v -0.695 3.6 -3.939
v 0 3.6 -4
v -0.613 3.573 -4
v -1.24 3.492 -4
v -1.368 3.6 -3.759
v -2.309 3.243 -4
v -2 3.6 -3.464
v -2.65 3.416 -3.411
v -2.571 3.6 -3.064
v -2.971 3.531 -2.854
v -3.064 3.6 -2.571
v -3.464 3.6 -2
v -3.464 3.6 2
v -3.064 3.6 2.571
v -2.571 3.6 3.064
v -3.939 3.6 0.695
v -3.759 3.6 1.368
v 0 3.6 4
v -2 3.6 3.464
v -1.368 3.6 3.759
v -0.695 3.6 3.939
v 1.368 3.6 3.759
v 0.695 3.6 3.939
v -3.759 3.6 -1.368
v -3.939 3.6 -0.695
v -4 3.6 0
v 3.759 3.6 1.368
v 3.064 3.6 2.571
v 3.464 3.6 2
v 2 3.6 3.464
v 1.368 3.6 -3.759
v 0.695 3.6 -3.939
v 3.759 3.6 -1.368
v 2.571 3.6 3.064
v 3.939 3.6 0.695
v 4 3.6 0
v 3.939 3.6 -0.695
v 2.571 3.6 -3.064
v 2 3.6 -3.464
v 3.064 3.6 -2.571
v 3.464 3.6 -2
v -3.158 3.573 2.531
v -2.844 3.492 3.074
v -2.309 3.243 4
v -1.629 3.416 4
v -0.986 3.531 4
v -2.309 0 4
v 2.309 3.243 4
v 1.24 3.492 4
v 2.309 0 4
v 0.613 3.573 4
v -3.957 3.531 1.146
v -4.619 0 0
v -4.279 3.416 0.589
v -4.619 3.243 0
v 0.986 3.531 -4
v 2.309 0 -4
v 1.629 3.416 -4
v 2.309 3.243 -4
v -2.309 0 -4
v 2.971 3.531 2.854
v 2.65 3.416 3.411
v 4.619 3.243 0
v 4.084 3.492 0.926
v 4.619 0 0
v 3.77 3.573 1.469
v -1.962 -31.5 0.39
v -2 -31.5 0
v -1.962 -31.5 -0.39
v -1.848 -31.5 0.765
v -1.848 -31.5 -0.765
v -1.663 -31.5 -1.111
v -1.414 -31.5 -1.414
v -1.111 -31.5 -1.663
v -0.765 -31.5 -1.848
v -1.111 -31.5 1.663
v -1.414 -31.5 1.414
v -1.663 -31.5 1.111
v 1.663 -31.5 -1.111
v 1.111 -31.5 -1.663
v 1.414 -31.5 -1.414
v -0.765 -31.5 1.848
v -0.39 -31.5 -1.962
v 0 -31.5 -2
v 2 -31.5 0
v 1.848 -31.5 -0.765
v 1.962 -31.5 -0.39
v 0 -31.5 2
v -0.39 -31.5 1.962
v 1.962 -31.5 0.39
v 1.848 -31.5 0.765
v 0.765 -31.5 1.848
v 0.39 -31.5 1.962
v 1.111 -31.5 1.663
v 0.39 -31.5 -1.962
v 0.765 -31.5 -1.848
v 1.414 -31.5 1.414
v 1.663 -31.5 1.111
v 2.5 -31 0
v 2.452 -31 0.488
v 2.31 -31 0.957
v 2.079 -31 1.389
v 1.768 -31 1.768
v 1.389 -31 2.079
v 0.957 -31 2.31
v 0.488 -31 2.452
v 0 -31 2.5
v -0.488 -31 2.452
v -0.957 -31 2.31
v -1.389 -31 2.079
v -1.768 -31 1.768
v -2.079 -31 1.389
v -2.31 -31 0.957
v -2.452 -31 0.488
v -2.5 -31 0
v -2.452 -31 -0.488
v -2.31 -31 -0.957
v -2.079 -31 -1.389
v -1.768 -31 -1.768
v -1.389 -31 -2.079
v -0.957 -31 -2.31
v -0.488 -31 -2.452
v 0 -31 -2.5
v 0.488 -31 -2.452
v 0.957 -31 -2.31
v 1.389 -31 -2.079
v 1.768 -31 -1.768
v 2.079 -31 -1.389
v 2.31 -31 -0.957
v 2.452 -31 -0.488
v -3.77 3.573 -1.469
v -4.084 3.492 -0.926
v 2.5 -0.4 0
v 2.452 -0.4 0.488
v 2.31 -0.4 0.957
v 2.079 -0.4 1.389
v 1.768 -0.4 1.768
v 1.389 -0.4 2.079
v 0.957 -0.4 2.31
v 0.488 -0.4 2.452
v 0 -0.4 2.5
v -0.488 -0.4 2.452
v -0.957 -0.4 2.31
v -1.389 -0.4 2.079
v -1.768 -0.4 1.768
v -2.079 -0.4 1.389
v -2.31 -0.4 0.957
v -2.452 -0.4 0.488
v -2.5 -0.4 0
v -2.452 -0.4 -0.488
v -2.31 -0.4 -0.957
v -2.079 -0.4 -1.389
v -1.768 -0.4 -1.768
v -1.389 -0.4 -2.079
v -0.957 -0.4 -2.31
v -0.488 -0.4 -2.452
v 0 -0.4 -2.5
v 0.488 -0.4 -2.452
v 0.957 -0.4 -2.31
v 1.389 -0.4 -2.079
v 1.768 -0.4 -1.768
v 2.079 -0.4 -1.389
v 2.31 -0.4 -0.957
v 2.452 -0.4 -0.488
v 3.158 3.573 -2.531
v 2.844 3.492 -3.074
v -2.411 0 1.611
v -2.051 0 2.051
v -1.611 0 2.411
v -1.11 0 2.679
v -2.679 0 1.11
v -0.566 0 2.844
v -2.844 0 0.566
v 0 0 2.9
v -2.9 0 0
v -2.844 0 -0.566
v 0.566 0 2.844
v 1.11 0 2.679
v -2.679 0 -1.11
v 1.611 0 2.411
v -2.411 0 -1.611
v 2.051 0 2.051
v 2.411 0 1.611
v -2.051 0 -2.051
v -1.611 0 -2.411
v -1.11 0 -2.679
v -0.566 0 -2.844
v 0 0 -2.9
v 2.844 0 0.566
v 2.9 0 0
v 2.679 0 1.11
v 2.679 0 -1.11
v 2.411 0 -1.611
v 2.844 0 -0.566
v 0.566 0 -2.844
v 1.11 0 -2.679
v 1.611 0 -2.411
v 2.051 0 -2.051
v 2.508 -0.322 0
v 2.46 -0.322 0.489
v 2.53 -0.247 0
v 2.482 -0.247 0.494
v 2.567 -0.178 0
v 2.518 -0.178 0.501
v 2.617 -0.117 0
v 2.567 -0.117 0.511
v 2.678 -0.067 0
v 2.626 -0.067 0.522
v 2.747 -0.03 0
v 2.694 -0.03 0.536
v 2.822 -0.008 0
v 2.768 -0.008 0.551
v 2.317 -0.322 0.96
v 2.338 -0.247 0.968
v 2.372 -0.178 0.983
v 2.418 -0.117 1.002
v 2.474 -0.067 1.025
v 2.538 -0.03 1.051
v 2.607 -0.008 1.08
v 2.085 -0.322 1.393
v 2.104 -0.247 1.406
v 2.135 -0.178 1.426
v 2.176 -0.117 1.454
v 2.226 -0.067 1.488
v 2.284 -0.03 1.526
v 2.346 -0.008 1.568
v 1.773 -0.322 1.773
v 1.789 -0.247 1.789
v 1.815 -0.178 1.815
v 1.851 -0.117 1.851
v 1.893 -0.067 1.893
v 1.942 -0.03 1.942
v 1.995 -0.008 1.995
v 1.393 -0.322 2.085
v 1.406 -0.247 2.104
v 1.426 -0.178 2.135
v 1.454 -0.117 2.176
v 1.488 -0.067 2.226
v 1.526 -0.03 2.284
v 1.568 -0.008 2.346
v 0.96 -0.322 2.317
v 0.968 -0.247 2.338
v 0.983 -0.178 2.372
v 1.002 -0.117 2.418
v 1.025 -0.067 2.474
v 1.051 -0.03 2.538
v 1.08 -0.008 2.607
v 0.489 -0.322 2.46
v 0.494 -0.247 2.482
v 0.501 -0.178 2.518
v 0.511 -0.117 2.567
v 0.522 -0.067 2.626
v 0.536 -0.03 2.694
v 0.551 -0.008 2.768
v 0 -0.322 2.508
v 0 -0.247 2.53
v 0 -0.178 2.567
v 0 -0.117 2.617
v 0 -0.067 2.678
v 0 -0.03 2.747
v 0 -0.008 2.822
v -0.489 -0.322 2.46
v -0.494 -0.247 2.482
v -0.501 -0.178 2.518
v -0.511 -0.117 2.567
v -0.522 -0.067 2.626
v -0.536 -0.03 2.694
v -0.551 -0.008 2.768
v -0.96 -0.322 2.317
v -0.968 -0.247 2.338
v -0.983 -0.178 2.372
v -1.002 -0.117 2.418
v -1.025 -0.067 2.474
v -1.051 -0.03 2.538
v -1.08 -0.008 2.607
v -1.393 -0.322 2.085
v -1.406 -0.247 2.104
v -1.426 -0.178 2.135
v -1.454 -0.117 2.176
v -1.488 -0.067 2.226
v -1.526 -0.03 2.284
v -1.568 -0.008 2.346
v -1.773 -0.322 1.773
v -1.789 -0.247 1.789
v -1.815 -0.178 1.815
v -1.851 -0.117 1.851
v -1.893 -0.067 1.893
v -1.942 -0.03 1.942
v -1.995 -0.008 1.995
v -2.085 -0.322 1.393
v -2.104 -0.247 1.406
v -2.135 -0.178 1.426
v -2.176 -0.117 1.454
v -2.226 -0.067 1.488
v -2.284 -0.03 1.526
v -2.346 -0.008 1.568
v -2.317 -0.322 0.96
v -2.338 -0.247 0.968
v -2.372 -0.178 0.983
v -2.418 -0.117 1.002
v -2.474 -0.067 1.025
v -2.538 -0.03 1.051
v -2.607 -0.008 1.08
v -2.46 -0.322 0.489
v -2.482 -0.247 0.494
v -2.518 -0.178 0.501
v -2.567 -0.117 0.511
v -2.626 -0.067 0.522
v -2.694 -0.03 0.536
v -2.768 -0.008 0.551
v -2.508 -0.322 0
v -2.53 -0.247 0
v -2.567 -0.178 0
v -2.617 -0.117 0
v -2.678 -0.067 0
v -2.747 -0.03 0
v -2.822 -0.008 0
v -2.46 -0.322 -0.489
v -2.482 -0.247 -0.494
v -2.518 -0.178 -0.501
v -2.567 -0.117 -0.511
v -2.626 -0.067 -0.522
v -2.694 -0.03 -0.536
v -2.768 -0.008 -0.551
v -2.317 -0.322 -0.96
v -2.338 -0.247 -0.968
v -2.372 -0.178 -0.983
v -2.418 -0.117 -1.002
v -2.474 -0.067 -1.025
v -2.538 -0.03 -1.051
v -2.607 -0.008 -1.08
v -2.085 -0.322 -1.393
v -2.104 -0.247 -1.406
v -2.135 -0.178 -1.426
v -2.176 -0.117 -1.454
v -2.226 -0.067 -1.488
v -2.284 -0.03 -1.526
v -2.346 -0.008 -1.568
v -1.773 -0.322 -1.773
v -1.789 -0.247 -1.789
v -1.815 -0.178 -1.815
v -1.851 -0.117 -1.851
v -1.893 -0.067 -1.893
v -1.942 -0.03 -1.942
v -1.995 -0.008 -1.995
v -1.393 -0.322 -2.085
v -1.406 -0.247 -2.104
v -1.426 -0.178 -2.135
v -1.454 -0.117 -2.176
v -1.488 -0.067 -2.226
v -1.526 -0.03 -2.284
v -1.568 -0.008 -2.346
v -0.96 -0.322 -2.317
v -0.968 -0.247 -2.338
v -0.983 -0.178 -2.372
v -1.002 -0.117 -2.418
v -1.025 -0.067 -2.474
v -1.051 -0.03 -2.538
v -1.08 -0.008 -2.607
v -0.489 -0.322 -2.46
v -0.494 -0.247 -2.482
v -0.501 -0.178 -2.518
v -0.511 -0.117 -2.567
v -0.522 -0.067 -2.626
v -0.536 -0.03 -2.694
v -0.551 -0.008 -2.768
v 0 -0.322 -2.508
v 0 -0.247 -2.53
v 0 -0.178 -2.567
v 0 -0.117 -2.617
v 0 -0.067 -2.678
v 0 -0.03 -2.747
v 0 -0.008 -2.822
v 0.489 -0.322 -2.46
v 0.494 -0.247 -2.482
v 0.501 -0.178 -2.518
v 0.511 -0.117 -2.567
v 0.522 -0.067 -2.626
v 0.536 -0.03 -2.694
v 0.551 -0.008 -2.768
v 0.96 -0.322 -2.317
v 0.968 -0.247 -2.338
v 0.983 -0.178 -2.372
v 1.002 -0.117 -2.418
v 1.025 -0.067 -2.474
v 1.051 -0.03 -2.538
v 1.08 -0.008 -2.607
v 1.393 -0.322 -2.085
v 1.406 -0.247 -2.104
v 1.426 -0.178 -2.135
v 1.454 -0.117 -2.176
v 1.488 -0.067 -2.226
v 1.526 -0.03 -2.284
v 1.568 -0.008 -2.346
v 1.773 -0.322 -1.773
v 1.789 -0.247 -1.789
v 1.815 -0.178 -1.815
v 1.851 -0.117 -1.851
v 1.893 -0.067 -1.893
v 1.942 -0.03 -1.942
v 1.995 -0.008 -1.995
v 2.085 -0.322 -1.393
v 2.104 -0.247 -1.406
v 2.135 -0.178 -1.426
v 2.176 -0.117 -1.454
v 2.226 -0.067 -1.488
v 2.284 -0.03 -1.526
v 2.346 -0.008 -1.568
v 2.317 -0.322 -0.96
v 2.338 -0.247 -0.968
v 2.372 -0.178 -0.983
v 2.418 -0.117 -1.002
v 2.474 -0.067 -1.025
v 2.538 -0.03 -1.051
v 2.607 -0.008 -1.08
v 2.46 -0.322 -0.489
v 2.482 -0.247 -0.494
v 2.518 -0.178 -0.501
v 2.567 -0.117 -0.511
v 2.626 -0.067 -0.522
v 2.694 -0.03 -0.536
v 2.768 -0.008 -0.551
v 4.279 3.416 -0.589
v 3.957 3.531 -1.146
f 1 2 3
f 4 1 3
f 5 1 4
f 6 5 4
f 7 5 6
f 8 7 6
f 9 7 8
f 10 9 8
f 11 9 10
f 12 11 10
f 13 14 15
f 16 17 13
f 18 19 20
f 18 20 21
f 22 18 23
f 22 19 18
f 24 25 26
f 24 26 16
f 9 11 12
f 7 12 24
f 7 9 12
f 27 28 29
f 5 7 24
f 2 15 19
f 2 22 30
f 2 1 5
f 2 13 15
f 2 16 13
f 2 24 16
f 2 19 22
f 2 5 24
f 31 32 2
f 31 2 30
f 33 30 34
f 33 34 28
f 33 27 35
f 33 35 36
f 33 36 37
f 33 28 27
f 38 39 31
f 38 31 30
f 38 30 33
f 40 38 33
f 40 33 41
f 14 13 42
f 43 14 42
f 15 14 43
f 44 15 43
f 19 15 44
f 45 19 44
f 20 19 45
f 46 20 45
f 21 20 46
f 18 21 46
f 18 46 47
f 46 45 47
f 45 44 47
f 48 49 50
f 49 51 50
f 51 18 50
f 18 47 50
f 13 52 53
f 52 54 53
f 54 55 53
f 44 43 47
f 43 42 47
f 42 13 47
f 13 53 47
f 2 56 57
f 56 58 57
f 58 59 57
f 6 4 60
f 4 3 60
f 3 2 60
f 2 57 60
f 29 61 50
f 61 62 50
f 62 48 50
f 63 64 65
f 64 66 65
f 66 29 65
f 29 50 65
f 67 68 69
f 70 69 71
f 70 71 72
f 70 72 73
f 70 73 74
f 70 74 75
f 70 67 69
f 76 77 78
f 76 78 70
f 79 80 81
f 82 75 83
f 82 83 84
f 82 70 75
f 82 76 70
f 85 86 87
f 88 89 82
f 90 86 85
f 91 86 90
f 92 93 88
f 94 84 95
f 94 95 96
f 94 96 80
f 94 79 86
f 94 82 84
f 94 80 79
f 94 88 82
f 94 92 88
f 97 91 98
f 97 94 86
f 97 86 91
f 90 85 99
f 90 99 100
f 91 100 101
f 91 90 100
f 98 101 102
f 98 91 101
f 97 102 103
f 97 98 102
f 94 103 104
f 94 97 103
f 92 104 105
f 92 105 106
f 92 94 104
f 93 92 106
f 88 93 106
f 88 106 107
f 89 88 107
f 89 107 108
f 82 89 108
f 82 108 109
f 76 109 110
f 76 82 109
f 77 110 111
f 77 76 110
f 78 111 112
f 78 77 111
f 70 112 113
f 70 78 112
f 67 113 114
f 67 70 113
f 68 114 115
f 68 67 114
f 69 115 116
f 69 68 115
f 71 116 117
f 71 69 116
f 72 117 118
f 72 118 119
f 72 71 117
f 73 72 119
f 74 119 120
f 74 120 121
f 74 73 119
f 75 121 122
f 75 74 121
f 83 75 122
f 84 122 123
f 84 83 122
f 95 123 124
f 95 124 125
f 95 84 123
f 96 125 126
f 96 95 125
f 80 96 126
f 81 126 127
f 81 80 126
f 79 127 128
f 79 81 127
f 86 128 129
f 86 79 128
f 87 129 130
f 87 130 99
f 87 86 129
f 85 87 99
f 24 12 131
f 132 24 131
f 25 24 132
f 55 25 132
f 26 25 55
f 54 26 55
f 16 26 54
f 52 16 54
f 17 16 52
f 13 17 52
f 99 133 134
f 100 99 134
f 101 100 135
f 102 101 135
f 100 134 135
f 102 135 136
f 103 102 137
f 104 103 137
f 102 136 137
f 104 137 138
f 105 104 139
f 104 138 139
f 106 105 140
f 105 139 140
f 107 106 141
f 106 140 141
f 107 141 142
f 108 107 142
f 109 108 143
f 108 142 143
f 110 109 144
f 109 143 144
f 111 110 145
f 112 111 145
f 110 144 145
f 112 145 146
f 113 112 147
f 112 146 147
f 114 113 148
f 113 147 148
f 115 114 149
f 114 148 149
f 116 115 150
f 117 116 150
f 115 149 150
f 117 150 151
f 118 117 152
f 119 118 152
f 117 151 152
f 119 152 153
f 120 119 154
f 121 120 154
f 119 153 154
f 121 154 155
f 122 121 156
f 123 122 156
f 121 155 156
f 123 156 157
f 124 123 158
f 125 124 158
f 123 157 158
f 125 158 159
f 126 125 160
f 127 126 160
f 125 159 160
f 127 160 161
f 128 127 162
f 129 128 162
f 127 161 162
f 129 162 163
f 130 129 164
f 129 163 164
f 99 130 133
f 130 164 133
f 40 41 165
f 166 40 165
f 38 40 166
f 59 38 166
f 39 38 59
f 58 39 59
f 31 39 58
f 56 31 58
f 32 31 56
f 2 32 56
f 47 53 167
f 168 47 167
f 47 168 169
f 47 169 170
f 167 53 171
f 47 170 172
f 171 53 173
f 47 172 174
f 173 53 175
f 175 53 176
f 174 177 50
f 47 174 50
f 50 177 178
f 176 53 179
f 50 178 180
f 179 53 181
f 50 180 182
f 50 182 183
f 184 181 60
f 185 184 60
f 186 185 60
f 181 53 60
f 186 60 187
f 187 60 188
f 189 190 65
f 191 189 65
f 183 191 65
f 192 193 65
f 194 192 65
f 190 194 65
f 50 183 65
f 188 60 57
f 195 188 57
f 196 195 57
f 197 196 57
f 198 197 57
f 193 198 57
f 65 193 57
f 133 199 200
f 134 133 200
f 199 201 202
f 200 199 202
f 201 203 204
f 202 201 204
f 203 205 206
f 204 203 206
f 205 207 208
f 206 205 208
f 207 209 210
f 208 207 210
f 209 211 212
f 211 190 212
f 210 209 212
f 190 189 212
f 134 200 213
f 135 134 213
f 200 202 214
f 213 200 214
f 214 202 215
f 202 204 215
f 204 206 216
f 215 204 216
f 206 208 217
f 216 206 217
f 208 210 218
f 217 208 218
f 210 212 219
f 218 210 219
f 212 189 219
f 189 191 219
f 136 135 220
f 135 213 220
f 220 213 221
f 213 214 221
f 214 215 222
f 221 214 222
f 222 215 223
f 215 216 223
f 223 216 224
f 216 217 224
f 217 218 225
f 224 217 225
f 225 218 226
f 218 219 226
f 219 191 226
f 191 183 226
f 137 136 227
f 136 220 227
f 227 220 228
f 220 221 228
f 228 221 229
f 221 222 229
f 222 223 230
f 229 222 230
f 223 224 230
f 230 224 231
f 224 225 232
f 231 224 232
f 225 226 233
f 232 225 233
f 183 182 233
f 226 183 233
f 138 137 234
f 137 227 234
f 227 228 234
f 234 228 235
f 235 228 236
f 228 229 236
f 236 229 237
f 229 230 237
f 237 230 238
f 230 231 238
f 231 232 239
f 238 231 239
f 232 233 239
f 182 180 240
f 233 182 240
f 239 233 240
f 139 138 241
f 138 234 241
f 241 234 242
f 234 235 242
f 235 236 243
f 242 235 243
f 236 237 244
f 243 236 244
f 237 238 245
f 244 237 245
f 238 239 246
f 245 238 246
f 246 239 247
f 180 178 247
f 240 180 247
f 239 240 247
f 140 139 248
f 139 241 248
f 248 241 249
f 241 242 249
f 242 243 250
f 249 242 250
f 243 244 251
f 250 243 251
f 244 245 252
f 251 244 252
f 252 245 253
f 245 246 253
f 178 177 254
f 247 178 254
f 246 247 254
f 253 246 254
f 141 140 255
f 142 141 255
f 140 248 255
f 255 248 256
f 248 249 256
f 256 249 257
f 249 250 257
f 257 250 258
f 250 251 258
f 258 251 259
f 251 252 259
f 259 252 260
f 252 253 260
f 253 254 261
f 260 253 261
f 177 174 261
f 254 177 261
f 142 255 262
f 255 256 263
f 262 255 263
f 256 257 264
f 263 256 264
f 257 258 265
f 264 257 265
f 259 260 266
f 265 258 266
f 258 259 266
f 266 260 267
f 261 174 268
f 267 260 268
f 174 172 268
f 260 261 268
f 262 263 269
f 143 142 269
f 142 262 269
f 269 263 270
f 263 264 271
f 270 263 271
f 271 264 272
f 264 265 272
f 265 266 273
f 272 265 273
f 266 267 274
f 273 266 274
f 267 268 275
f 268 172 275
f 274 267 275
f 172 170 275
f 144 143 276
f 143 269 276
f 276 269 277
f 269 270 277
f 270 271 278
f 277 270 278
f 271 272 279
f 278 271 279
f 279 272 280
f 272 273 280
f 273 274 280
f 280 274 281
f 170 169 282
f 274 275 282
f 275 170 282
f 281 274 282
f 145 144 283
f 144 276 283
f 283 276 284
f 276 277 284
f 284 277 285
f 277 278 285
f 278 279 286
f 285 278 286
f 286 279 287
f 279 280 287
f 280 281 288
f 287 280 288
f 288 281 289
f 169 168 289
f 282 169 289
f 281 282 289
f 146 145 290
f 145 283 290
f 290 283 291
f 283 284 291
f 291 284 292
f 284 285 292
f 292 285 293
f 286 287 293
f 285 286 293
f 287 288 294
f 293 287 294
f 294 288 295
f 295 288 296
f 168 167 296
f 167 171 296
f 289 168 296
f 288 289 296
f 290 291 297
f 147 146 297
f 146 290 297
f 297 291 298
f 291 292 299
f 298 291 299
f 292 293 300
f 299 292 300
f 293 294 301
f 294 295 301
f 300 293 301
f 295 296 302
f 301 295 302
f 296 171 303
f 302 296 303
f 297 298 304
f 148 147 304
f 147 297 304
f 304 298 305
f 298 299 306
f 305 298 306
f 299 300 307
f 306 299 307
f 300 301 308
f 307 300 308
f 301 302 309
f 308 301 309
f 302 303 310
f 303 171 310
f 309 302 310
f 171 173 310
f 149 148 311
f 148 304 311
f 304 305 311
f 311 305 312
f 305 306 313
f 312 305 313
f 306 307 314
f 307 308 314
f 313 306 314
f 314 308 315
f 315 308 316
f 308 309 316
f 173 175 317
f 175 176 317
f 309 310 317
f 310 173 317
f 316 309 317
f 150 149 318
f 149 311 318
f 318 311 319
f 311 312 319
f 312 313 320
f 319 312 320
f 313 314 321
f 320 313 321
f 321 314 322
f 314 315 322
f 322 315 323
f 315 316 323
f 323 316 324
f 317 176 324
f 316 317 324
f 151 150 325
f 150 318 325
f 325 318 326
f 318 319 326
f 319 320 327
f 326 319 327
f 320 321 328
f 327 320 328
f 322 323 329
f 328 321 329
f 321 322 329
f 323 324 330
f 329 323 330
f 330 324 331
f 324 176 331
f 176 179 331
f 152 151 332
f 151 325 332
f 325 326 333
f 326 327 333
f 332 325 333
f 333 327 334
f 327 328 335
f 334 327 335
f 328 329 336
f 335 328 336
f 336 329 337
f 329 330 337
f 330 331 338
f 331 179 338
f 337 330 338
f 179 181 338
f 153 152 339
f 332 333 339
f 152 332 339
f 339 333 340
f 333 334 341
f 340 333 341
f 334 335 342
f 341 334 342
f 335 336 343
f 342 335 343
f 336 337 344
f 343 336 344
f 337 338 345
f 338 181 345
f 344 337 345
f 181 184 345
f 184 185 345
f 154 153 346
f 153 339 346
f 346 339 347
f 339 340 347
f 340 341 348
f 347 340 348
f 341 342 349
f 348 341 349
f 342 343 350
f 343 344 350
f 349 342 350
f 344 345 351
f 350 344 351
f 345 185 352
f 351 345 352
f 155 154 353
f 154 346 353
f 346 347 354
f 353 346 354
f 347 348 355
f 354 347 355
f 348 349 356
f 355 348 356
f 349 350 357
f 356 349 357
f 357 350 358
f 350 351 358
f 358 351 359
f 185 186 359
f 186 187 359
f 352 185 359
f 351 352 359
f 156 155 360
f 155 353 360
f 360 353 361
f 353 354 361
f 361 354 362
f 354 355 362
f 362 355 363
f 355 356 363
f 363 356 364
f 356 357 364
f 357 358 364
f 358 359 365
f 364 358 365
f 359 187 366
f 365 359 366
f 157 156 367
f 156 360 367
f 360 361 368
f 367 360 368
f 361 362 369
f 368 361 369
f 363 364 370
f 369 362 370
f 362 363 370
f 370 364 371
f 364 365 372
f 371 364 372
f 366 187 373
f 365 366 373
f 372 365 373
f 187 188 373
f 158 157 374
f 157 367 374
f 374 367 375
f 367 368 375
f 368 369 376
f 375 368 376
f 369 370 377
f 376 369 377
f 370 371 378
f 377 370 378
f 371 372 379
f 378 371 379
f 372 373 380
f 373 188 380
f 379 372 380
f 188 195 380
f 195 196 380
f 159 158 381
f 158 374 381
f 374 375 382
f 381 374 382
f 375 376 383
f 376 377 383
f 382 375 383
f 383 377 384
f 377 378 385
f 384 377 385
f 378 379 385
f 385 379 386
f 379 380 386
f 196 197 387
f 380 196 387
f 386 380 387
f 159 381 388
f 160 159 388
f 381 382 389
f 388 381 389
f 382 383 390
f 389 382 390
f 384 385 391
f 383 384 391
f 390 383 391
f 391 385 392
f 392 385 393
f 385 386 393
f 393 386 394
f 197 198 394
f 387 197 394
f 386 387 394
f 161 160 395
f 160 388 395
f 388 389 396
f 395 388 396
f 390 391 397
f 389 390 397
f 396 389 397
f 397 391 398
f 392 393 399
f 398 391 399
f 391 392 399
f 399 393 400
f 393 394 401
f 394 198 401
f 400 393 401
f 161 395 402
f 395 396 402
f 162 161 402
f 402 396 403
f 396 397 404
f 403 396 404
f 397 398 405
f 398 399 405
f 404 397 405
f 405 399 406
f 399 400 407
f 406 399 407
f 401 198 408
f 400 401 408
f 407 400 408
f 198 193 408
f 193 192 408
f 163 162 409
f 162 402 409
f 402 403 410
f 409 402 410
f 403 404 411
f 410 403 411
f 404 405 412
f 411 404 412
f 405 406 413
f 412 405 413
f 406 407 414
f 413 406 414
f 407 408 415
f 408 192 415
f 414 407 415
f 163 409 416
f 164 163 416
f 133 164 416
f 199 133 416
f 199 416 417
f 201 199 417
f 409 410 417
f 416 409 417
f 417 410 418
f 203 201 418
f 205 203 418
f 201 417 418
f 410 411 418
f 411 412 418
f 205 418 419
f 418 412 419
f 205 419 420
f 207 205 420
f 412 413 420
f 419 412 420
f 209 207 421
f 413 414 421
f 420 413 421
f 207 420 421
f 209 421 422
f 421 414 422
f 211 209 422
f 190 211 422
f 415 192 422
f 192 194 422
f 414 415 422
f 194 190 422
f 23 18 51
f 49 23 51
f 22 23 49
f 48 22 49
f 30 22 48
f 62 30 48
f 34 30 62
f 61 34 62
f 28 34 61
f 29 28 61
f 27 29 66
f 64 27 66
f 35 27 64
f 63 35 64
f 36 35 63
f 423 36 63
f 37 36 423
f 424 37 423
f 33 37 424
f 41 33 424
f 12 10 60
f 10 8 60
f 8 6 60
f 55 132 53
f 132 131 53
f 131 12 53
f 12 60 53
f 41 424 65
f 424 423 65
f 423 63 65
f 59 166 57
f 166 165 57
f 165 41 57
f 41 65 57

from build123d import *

# Parameters (mm, degrees)
BOSS_EXTRUDE1_DEPTH = 3.6
SKETCH3_R           = 2.5
BOSS_EXTRUDE2_DEPTH = 31.5
CHAMFER1_SIZE       = 0.5
FILLET1_R           = 0.4


with BuildPart() as part:
    # Sketch1 → Boss-Extrude1 (new body)
    with BuildSketch(Plane(origin=(0, 0, 0), x_dir=(1, 0, 0), z_dir=(0, 1, 0))):
        Polygon((-2.309401077, -4), (2.309401077, -4), (4.618802154, 0), (2.309401077, 4), (-2.309401077, 4), (-4.618802154, 0), align=None)
    extrude(amount=BOSS_EXTRUDE1_DEPTH)

    # Sketch2 → Cut-Revolve1 (revolve, cut)
    with BuildSketch(Plane(origin=(0, 0, 0), x_dir=(0, 0, -1), z_dir=(1, 0, 0))):
        Polygon((8.326224825, 1.102252933), (4, 3.6), (8.326224825, 3.6), align=None)
    revolve(axis=Axis((0, 0, 0), (0, 1, 0)), mode=Mode.SUBTRACT)

    # Sketch3 → Boss-Extrude2 (add)
    with BuildSketch(Plane.XZ):
        Circle(SKETCH3_R)
    extrude(amount=BOSS_EXTRUDE2_DEPTH)

    # Chamfer1
    chamfer1_edges = [part.edges().sort_by_distance(p)[0] for p in [
        (-2.5, -31.5, 0),
    ]]
    chamfer(chamfer1_edges, length=CHAMFER1_SIZE)

    # Fillet1
    fillet1_edges = [part.edges().sort_by_distance(p)[0] for p in [
        (-2.5, 0, 0),
    ]]
    fillet(fillet1_edges, radius=FILLET1_R)


solid = part.part
